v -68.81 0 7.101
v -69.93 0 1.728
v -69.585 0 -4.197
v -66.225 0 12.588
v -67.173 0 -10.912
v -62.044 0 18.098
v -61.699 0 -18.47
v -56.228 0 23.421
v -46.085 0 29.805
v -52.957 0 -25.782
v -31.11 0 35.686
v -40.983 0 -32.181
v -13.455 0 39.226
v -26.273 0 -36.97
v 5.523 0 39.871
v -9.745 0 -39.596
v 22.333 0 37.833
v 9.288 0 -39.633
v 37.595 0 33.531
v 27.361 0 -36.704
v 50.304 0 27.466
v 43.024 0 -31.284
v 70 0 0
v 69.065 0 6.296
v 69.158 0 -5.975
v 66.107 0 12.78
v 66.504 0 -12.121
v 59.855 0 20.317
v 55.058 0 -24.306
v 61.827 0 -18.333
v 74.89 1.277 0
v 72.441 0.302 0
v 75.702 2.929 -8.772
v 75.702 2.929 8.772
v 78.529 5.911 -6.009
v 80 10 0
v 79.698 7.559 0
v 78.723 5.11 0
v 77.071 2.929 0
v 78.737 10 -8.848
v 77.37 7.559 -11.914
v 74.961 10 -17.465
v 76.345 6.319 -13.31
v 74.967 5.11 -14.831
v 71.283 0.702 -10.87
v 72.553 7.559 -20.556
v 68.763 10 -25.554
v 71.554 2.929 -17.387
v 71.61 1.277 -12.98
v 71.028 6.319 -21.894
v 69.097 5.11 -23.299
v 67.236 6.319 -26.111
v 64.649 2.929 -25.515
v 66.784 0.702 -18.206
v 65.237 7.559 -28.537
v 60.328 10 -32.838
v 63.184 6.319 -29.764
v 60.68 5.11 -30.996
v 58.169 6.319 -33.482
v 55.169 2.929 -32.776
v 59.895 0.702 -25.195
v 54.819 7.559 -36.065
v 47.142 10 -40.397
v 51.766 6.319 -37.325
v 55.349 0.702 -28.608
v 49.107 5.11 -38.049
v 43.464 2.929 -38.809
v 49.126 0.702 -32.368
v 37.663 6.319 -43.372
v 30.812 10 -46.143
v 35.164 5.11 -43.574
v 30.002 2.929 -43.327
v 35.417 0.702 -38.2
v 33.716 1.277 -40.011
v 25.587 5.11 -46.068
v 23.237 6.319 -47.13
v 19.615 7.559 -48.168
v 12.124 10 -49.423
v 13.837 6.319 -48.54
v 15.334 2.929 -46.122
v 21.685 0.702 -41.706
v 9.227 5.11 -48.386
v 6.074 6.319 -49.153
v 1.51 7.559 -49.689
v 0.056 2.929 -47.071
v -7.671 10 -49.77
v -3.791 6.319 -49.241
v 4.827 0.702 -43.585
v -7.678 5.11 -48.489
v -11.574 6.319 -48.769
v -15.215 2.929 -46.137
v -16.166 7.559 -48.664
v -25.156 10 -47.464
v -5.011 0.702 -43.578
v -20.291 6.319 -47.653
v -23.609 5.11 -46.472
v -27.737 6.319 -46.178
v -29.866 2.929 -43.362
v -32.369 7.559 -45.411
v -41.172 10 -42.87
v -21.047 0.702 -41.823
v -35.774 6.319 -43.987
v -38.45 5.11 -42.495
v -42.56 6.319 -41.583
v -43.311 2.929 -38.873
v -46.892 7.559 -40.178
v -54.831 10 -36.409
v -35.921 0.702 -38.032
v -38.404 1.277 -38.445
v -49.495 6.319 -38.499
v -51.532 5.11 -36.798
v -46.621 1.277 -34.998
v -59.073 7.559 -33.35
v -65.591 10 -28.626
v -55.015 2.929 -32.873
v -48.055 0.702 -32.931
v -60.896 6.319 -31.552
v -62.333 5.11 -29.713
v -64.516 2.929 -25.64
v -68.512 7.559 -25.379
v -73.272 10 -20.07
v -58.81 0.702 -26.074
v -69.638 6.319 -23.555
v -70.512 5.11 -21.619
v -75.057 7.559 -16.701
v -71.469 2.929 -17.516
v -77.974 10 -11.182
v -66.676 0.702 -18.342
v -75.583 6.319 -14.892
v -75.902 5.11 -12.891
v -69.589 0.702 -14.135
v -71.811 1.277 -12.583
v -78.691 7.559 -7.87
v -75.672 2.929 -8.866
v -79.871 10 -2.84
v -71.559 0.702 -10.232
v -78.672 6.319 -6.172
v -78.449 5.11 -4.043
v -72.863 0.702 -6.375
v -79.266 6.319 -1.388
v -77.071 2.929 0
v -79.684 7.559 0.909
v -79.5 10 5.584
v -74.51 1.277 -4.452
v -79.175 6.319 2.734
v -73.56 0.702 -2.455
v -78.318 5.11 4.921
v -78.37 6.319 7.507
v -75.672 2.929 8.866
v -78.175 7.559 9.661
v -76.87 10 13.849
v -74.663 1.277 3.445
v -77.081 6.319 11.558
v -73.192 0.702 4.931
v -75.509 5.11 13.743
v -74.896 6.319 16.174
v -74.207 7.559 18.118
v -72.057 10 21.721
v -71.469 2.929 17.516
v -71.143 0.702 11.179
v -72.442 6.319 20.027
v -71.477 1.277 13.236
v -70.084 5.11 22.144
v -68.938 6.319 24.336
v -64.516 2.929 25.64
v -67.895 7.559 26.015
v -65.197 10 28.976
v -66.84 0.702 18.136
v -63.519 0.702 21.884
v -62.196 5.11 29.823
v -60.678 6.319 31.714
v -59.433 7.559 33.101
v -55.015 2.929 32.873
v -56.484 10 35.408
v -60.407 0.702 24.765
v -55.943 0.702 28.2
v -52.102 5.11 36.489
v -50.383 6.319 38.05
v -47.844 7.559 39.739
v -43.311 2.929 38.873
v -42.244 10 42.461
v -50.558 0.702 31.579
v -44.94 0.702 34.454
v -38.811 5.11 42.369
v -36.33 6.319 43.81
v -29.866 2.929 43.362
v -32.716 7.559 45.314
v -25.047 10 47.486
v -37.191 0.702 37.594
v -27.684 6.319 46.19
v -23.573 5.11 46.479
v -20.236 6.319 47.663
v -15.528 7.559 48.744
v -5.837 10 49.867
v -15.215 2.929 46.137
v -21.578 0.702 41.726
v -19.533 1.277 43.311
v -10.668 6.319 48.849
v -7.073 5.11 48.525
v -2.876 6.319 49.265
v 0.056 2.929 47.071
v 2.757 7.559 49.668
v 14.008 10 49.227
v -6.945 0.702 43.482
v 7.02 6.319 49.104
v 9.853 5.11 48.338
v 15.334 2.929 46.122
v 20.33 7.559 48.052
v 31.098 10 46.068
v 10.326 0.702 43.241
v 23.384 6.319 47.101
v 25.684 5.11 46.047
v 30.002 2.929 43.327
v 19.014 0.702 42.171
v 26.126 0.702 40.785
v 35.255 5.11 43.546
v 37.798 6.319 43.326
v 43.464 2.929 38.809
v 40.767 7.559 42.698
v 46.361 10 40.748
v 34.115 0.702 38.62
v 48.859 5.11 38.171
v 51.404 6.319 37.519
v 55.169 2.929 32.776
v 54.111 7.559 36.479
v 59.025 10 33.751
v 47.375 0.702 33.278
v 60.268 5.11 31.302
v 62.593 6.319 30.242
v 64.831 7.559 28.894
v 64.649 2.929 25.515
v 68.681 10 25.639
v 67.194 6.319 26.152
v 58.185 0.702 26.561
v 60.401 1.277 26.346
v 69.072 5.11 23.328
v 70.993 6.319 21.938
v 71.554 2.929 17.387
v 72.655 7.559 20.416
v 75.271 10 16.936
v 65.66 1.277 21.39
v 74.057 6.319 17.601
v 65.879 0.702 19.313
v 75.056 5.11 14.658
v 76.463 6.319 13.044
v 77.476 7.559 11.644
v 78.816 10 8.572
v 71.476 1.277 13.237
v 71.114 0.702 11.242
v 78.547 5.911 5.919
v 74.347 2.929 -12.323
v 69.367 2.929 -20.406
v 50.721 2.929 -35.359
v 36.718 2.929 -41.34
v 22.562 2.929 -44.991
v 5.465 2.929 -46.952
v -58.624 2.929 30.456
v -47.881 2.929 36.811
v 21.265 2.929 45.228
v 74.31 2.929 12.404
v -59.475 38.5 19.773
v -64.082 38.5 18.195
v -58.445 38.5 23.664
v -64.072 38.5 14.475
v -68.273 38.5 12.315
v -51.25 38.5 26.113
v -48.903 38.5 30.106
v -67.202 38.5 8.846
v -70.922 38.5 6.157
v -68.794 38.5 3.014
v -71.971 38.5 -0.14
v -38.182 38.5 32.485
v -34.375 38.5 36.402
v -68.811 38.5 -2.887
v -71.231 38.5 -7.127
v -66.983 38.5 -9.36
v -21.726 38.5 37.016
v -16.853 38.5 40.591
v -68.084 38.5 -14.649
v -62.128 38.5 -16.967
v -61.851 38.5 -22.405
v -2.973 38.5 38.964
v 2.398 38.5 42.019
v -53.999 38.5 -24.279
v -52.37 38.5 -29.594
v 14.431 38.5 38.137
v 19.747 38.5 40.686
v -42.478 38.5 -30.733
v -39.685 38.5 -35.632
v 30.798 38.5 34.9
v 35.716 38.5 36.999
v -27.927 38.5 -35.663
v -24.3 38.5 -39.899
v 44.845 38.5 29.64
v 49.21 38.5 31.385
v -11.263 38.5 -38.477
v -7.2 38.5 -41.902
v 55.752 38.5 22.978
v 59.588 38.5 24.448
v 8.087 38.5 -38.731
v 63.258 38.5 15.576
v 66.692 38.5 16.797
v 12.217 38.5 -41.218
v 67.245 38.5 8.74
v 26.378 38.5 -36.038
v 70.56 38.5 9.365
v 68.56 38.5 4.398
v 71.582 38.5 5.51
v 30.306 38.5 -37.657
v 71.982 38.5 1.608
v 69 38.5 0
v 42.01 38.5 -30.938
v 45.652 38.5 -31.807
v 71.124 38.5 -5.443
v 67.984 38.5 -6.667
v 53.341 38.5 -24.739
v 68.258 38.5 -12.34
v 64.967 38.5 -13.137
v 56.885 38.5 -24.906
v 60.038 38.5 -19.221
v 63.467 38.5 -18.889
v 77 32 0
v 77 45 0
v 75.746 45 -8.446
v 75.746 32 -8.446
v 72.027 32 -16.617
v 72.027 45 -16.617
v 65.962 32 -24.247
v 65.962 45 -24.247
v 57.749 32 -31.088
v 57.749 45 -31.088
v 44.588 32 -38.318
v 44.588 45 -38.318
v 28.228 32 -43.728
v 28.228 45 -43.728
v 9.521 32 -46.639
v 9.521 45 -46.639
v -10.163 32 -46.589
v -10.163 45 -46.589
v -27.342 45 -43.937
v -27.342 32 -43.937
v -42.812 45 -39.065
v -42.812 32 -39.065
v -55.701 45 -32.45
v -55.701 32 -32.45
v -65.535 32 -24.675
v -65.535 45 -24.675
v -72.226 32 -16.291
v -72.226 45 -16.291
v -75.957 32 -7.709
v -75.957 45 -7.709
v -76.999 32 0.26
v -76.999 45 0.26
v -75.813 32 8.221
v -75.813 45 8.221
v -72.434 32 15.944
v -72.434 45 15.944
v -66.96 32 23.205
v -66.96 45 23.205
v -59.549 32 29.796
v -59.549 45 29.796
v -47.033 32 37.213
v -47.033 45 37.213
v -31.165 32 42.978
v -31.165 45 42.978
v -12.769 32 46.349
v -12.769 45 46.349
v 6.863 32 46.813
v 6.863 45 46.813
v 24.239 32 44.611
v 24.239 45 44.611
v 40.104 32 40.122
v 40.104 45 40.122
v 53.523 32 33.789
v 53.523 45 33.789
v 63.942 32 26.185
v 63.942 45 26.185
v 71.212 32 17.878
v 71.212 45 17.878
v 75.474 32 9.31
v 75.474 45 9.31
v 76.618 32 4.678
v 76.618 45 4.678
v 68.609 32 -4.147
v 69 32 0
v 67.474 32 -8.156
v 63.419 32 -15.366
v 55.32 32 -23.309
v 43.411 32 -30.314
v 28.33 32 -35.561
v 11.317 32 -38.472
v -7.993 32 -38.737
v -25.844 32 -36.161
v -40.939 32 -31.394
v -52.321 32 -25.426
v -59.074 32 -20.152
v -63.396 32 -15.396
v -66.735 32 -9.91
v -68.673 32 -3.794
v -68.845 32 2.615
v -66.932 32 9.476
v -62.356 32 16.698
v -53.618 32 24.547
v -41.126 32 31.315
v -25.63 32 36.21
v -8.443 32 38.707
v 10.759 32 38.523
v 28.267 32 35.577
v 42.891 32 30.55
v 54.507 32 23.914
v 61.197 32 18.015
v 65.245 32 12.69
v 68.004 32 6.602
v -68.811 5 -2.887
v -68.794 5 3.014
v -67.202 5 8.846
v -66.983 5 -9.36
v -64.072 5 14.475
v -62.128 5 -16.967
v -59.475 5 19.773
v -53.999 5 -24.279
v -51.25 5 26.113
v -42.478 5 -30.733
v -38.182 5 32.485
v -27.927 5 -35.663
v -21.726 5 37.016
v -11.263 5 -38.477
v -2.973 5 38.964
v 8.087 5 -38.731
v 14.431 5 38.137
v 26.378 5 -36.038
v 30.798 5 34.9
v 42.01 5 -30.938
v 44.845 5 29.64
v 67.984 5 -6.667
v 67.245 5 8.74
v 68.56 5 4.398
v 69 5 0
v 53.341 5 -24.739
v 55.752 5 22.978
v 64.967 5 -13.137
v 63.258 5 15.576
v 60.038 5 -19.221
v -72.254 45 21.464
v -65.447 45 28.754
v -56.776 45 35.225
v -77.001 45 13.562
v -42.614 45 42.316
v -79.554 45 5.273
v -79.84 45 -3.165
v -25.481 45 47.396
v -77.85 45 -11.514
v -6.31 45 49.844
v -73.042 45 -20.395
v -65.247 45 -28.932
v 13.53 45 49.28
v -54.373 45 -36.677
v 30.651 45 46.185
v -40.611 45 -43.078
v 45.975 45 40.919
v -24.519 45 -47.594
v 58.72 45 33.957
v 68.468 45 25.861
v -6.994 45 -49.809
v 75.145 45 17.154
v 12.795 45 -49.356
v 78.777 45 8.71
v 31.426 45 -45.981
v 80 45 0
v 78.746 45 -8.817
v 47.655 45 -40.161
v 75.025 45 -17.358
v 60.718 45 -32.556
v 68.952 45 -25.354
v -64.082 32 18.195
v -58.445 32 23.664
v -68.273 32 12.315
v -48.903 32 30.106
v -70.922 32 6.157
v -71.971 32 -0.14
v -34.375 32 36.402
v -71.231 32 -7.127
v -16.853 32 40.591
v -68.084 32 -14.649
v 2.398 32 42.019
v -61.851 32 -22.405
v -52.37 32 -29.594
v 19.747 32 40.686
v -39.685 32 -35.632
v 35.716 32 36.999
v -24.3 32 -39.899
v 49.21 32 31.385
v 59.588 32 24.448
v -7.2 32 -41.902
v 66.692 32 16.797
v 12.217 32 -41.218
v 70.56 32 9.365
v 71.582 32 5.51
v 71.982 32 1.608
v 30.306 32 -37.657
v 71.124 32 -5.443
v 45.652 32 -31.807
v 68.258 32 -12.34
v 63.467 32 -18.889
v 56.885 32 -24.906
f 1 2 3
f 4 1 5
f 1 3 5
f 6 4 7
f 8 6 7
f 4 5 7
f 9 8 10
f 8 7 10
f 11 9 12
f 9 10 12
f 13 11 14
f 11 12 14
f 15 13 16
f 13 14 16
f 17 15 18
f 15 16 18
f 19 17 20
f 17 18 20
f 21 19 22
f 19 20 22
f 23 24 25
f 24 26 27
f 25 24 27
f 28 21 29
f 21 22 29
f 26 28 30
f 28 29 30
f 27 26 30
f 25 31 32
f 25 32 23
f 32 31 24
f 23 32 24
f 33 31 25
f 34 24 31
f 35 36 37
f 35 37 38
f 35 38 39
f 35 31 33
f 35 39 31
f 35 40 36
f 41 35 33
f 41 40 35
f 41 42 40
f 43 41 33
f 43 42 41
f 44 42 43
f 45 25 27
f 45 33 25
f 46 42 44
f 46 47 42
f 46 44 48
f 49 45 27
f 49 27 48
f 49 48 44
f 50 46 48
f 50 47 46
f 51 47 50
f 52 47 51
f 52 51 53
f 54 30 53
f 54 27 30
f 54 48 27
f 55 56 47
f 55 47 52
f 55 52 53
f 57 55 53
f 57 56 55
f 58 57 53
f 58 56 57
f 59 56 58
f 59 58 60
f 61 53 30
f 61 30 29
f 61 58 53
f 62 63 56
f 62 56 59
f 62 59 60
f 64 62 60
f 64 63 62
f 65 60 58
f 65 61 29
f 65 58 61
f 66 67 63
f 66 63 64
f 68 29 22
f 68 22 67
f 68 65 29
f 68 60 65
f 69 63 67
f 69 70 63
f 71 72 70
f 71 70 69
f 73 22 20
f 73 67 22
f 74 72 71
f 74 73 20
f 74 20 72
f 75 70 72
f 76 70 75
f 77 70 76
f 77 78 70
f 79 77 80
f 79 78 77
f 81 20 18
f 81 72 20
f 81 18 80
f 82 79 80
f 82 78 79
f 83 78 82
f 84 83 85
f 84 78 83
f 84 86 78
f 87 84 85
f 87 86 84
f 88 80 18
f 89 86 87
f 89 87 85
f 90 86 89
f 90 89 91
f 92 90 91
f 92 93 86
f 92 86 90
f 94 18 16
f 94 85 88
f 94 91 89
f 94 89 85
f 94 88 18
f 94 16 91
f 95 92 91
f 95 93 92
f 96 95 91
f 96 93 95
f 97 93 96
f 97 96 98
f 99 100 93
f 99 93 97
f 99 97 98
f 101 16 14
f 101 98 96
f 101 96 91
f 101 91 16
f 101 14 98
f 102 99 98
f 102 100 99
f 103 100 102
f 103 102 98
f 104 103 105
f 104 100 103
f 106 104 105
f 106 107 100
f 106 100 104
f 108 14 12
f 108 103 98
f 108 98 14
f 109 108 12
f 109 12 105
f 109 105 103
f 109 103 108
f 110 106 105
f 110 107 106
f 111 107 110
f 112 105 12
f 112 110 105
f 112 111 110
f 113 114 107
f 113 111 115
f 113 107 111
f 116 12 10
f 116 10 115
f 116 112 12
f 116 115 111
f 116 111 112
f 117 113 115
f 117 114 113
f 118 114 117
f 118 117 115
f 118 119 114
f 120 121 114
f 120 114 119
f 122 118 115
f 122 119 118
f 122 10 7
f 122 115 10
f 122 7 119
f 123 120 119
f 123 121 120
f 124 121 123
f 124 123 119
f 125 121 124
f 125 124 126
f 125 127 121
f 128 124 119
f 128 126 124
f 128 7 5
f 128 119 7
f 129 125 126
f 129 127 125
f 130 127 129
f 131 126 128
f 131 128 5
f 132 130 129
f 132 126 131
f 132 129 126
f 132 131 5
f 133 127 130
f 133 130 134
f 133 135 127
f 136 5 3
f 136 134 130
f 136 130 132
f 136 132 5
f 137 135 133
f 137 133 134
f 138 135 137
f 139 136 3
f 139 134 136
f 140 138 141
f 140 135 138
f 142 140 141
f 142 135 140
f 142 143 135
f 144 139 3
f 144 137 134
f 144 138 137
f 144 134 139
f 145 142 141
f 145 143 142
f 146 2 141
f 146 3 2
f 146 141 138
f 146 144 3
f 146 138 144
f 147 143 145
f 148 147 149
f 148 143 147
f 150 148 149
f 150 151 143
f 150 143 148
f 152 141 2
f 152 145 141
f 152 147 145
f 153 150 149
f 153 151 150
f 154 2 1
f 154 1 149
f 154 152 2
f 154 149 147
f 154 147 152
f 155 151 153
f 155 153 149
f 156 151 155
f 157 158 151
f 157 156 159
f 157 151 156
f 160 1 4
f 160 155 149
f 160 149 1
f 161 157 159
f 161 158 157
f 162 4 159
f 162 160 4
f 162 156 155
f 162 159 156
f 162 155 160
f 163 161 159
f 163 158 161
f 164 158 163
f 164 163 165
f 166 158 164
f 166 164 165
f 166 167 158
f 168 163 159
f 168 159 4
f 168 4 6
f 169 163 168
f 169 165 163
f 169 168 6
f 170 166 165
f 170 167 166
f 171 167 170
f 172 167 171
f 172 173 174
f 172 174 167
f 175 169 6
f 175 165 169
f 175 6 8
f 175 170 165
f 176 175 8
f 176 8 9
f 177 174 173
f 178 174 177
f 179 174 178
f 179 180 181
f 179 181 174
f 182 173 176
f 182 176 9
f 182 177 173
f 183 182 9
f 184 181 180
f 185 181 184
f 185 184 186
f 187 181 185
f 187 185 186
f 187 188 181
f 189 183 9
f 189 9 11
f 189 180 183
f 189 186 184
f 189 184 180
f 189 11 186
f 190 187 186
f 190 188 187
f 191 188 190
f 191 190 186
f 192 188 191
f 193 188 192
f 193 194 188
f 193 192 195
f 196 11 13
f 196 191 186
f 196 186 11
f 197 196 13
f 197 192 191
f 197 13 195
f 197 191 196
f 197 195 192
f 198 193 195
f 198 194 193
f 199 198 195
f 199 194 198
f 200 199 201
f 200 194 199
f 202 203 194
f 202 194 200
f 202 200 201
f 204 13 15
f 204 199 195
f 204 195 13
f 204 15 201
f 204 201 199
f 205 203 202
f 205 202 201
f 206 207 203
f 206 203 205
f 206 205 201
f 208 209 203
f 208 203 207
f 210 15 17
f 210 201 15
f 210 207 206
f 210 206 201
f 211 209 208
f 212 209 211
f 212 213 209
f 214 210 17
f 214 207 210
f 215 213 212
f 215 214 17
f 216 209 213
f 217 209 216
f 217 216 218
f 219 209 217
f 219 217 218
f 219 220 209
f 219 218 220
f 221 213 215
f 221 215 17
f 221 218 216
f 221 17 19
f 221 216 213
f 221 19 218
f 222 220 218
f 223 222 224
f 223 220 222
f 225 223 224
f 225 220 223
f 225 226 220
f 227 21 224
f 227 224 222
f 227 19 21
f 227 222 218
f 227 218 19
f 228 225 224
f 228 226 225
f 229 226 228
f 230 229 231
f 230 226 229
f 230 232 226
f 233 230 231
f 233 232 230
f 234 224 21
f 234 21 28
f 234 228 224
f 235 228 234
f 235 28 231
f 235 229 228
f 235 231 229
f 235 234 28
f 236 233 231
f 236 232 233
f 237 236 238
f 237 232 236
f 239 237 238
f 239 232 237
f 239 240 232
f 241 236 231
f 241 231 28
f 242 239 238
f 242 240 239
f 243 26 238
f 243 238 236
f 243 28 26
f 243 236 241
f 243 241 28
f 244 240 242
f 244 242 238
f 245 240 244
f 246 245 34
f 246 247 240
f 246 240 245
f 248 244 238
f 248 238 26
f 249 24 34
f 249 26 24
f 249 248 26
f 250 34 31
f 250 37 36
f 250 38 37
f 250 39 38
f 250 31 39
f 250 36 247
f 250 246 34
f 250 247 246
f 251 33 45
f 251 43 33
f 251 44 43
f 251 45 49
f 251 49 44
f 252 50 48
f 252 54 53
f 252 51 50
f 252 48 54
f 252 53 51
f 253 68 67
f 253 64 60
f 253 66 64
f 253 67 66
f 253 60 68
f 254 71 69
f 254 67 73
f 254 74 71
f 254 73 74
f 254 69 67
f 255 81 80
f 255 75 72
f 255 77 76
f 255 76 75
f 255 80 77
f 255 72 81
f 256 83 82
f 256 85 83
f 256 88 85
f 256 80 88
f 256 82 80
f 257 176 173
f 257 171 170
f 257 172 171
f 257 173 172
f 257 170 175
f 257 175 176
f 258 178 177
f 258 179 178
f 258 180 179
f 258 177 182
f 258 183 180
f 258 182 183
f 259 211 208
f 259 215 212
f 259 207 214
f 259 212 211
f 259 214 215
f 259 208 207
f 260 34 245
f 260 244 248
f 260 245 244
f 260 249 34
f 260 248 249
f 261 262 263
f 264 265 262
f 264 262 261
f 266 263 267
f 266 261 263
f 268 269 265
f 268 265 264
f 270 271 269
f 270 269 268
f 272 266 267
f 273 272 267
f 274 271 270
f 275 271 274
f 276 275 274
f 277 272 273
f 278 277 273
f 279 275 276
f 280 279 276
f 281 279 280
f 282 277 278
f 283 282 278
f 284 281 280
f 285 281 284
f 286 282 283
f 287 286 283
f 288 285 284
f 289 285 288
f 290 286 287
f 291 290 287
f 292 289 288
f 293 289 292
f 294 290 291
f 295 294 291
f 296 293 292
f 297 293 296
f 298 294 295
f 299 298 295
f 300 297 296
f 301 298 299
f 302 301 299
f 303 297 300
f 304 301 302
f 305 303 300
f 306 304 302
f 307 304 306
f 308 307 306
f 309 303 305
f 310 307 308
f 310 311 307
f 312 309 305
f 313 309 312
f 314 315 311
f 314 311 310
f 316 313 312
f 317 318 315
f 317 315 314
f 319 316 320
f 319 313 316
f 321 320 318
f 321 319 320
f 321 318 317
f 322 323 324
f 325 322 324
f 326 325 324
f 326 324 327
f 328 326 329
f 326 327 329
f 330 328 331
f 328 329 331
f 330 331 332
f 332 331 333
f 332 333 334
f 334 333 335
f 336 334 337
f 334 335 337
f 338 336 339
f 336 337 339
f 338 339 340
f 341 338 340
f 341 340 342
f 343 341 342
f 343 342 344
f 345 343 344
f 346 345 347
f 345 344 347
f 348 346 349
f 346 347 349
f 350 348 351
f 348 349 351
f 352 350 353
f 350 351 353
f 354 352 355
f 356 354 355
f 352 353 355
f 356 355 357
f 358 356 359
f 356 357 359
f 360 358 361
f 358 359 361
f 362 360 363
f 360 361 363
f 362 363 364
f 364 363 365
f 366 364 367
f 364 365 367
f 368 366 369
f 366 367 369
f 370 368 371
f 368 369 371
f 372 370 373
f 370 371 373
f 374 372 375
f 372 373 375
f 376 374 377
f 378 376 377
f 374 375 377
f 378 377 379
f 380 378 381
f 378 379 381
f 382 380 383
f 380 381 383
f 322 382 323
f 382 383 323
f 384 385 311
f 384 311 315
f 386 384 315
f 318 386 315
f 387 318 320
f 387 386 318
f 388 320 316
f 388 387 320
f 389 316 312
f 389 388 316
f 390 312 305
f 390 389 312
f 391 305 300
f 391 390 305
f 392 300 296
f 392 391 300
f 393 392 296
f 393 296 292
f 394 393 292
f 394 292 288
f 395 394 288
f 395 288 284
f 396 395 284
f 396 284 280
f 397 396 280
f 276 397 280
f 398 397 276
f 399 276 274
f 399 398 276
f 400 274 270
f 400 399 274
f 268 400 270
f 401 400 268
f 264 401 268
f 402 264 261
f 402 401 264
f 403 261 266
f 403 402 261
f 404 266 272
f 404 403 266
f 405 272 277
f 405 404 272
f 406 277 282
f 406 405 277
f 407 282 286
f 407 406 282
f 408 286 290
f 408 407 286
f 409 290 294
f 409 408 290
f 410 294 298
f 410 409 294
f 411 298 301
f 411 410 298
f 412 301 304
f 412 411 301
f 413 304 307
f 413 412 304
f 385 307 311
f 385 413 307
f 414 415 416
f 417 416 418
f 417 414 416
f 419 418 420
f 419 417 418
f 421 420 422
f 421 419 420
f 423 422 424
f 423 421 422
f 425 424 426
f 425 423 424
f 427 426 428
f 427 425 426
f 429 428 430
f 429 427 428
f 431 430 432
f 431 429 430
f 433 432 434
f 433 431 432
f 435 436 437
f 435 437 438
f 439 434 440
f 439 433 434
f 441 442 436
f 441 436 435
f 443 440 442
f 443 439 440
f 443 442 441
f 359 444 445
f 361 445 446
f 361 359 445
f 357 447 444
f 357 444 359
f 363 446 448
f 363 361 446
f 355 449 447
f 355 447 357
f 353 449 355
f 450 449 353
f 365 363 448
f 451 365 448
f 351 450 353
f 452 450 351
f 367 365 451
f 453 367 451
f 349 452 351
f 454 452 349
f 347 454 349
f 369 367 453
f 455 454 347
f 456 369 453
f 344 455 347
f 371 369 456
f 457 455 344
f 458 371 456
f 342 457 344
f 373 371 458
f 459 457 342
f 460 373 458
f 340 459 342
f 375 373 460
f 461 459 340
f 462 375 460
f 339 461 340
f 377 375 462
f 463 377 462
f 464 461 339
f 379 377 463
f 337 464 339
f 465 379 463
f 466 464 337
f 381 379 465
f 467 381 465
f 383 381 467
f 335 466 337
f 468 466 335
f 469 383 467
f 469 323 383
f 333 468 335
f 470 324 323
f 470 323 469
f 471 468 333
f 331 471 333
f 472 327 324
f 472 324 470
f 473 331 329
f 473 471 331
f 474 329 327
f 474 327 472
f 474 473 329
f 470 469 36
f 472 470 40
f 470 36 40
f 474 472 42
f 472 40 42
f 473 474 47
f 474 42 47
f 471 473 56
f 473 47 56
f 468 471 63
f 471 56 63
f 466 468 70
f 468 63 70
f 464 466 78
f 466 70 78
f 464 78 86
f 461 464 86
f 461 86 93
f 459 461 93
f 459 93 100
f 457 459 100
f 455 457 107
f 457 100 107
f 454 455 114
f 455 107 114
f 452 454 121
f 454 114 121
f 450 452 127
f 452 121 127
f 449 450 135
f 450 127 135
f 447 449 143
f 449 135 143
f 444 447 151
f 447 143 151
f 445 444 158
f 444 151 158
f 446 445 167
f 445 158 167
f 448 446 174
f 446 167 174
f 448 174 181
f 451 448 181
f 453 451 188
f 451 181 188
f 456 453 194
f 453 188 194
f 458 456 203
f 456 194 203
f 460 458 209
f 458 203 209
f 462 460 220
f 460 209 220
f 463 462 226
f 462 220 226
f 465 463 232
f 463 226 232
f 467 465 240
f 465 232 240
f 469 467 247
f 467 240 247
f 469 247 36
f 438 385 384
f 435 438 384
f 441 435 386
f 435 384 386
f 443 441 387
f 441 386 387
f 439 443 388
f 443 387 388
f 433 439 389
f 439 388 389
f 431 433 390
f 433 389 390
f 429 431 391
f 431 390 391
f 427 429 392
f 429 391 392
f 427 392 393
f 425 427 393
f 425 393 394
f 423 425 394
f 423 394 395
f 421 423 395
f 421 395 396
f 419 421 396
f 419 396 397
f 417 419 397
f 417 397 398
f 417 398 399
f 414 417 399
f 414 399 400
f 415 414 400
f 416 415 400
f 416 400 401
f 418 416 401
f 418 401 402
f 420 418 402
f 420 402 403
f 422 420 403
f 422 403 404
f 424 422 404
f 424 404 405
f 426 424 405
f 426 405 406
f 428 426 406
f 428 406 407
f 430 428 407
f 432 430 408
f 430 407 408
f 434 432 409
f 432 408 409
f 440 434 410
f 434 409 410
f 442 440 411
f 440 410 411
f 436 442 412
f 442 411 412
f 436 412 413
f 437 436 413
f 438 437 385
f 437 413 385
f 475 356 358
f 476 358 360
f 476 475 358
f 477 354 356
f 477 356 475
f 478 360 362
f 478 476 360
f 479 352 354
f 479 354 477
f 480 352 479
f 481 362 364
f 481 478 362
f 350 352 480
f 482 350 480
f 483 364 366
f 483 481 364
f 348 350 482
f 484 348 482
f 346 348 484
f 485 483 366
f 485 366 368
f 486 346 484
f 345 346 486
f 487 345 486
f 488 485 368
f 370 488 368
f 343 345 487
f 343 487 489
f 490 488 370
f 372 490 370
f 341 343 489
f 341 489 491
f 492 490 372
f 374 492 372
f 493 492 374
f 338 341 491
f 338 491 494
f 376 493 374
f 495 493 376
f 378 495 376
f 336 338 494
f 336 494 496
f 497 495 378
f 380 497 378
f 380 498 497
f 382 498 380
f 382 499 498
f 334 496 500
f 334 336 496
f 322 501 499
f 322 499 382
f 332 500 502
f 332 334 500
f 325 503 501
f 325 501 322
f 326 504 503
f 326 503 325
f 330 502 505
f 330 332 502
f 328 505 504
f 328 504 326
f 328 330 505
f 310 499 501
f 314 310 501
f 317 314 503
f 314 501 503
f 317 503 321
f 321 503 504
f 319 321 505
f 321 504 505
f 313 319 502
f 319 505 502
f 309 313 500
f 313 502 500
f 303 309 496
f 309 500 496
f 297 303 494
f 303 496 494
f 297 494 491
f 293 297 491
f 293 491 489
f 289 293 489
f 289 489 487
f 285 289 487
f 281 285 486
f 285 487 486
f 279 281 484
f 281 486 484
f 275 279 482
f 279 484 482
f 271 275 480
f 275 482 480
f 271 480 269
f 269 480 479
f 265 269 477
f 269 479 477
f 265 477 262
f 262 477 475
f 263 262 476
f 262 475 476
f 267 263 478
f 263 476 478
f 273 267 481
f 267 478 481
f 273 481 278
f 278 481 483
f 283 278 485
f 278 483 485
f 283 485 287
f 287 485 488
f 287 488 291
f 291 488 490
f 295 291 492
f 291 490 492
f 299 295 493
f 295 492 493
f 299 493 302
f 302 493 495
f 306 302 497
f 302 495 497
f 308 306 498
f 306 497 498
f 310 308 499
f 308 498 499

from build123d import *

# Parameters (mm, degrees)
SKETCH2_RX          = 80
SKETCH2_RY          = 50
BOSS_EXTRUDE1_DEPTH = 45
FILLET2_R           = 10
SKETCH3_RX          = 69
SKETCH3_RY          = 39
CUT_EXTRUDE1_DEPTH  = 40
SKETCH4_RX          = 77
SKETCH4_RY          = 47
CUT_EXTRUDE2_DEPTH  = 13
SKETCH5_RX          = 72
SKETCH5_RY          = 42
SKETCH5_RX_2        = 69
SKETCH5_RY_2        = 39
BOSS_EXTRUDE2_DEPTH = 6.5


with BuildPart() as part:
    # Sketch2 → Boss-Extrude1 (new body)
    with BuildSketch(Plane(origin=(0, 0, 0), x_dir=(1, 0, 0), z_dir=(0, 1, 0))):
        with Locations((0, 0)):
            Ellipse(SKETCH2_RX, SKETCH2_RY)
    extrude(amount=BOSS_EXTRUDE1_DEPTH)

    # Fillet2
    fillet2_edges = [part.edges().sort_by_distance(p)[0] for p in [
        (-79.999879829, 0, 0.086664306),
    ]]
    fillet(fillet2_edges, radius=FILLET2_R)

    # Sketch3 → Cut-Extrude1 (cut)
    with BuildSketch(Plane(origin=(0, 45, 0), x_dir=(1, 0, 0), z_dir=(0, 1, 0))):
        with Locations((0, 0)):
            Ellipse(SKETCH3_RX, SKETCH3_RY)
    extrude(amount=-CUT_EXTRUDE1_DEPTH, mode=Mode.SUBTRACT)

    # Sketch4 → Cut-Extrude2 (cut)
    with BuildSketch(Plane(origin=(0, 45, 0), x_dir=(1, 0, 0), z_dir=(0, 1, 0))):
        with Locations((0, 0)):
            Ellipse(SKETCH4_RX, SKETCH4_RY)
    extrude(amount=-CUT_EXTRUDE2_DEPTH, mode=Mode.SUBTRACT)

    # Sketch5 → Boss-Extrude2 (add)
    with BuildSketch(Plane(origin=(0, 32, 0), x_dir=(1, 0, 0), z_dir=(0, 1, 0))):
        with Locations(Location((0, 0), (0, 0, -1.279425375))):
            Ellipse(SKETCH5_RX, SKETCH5_RY)
        with Locations((0, 0)):
            Ellipse(SKETCH5_RX_2, SKETCH5_RY_2, mode=Mode.SUBTRACT)
    extrude(amount=BOSS_EXTRUDE2_DEPTH)


solid = part.part
